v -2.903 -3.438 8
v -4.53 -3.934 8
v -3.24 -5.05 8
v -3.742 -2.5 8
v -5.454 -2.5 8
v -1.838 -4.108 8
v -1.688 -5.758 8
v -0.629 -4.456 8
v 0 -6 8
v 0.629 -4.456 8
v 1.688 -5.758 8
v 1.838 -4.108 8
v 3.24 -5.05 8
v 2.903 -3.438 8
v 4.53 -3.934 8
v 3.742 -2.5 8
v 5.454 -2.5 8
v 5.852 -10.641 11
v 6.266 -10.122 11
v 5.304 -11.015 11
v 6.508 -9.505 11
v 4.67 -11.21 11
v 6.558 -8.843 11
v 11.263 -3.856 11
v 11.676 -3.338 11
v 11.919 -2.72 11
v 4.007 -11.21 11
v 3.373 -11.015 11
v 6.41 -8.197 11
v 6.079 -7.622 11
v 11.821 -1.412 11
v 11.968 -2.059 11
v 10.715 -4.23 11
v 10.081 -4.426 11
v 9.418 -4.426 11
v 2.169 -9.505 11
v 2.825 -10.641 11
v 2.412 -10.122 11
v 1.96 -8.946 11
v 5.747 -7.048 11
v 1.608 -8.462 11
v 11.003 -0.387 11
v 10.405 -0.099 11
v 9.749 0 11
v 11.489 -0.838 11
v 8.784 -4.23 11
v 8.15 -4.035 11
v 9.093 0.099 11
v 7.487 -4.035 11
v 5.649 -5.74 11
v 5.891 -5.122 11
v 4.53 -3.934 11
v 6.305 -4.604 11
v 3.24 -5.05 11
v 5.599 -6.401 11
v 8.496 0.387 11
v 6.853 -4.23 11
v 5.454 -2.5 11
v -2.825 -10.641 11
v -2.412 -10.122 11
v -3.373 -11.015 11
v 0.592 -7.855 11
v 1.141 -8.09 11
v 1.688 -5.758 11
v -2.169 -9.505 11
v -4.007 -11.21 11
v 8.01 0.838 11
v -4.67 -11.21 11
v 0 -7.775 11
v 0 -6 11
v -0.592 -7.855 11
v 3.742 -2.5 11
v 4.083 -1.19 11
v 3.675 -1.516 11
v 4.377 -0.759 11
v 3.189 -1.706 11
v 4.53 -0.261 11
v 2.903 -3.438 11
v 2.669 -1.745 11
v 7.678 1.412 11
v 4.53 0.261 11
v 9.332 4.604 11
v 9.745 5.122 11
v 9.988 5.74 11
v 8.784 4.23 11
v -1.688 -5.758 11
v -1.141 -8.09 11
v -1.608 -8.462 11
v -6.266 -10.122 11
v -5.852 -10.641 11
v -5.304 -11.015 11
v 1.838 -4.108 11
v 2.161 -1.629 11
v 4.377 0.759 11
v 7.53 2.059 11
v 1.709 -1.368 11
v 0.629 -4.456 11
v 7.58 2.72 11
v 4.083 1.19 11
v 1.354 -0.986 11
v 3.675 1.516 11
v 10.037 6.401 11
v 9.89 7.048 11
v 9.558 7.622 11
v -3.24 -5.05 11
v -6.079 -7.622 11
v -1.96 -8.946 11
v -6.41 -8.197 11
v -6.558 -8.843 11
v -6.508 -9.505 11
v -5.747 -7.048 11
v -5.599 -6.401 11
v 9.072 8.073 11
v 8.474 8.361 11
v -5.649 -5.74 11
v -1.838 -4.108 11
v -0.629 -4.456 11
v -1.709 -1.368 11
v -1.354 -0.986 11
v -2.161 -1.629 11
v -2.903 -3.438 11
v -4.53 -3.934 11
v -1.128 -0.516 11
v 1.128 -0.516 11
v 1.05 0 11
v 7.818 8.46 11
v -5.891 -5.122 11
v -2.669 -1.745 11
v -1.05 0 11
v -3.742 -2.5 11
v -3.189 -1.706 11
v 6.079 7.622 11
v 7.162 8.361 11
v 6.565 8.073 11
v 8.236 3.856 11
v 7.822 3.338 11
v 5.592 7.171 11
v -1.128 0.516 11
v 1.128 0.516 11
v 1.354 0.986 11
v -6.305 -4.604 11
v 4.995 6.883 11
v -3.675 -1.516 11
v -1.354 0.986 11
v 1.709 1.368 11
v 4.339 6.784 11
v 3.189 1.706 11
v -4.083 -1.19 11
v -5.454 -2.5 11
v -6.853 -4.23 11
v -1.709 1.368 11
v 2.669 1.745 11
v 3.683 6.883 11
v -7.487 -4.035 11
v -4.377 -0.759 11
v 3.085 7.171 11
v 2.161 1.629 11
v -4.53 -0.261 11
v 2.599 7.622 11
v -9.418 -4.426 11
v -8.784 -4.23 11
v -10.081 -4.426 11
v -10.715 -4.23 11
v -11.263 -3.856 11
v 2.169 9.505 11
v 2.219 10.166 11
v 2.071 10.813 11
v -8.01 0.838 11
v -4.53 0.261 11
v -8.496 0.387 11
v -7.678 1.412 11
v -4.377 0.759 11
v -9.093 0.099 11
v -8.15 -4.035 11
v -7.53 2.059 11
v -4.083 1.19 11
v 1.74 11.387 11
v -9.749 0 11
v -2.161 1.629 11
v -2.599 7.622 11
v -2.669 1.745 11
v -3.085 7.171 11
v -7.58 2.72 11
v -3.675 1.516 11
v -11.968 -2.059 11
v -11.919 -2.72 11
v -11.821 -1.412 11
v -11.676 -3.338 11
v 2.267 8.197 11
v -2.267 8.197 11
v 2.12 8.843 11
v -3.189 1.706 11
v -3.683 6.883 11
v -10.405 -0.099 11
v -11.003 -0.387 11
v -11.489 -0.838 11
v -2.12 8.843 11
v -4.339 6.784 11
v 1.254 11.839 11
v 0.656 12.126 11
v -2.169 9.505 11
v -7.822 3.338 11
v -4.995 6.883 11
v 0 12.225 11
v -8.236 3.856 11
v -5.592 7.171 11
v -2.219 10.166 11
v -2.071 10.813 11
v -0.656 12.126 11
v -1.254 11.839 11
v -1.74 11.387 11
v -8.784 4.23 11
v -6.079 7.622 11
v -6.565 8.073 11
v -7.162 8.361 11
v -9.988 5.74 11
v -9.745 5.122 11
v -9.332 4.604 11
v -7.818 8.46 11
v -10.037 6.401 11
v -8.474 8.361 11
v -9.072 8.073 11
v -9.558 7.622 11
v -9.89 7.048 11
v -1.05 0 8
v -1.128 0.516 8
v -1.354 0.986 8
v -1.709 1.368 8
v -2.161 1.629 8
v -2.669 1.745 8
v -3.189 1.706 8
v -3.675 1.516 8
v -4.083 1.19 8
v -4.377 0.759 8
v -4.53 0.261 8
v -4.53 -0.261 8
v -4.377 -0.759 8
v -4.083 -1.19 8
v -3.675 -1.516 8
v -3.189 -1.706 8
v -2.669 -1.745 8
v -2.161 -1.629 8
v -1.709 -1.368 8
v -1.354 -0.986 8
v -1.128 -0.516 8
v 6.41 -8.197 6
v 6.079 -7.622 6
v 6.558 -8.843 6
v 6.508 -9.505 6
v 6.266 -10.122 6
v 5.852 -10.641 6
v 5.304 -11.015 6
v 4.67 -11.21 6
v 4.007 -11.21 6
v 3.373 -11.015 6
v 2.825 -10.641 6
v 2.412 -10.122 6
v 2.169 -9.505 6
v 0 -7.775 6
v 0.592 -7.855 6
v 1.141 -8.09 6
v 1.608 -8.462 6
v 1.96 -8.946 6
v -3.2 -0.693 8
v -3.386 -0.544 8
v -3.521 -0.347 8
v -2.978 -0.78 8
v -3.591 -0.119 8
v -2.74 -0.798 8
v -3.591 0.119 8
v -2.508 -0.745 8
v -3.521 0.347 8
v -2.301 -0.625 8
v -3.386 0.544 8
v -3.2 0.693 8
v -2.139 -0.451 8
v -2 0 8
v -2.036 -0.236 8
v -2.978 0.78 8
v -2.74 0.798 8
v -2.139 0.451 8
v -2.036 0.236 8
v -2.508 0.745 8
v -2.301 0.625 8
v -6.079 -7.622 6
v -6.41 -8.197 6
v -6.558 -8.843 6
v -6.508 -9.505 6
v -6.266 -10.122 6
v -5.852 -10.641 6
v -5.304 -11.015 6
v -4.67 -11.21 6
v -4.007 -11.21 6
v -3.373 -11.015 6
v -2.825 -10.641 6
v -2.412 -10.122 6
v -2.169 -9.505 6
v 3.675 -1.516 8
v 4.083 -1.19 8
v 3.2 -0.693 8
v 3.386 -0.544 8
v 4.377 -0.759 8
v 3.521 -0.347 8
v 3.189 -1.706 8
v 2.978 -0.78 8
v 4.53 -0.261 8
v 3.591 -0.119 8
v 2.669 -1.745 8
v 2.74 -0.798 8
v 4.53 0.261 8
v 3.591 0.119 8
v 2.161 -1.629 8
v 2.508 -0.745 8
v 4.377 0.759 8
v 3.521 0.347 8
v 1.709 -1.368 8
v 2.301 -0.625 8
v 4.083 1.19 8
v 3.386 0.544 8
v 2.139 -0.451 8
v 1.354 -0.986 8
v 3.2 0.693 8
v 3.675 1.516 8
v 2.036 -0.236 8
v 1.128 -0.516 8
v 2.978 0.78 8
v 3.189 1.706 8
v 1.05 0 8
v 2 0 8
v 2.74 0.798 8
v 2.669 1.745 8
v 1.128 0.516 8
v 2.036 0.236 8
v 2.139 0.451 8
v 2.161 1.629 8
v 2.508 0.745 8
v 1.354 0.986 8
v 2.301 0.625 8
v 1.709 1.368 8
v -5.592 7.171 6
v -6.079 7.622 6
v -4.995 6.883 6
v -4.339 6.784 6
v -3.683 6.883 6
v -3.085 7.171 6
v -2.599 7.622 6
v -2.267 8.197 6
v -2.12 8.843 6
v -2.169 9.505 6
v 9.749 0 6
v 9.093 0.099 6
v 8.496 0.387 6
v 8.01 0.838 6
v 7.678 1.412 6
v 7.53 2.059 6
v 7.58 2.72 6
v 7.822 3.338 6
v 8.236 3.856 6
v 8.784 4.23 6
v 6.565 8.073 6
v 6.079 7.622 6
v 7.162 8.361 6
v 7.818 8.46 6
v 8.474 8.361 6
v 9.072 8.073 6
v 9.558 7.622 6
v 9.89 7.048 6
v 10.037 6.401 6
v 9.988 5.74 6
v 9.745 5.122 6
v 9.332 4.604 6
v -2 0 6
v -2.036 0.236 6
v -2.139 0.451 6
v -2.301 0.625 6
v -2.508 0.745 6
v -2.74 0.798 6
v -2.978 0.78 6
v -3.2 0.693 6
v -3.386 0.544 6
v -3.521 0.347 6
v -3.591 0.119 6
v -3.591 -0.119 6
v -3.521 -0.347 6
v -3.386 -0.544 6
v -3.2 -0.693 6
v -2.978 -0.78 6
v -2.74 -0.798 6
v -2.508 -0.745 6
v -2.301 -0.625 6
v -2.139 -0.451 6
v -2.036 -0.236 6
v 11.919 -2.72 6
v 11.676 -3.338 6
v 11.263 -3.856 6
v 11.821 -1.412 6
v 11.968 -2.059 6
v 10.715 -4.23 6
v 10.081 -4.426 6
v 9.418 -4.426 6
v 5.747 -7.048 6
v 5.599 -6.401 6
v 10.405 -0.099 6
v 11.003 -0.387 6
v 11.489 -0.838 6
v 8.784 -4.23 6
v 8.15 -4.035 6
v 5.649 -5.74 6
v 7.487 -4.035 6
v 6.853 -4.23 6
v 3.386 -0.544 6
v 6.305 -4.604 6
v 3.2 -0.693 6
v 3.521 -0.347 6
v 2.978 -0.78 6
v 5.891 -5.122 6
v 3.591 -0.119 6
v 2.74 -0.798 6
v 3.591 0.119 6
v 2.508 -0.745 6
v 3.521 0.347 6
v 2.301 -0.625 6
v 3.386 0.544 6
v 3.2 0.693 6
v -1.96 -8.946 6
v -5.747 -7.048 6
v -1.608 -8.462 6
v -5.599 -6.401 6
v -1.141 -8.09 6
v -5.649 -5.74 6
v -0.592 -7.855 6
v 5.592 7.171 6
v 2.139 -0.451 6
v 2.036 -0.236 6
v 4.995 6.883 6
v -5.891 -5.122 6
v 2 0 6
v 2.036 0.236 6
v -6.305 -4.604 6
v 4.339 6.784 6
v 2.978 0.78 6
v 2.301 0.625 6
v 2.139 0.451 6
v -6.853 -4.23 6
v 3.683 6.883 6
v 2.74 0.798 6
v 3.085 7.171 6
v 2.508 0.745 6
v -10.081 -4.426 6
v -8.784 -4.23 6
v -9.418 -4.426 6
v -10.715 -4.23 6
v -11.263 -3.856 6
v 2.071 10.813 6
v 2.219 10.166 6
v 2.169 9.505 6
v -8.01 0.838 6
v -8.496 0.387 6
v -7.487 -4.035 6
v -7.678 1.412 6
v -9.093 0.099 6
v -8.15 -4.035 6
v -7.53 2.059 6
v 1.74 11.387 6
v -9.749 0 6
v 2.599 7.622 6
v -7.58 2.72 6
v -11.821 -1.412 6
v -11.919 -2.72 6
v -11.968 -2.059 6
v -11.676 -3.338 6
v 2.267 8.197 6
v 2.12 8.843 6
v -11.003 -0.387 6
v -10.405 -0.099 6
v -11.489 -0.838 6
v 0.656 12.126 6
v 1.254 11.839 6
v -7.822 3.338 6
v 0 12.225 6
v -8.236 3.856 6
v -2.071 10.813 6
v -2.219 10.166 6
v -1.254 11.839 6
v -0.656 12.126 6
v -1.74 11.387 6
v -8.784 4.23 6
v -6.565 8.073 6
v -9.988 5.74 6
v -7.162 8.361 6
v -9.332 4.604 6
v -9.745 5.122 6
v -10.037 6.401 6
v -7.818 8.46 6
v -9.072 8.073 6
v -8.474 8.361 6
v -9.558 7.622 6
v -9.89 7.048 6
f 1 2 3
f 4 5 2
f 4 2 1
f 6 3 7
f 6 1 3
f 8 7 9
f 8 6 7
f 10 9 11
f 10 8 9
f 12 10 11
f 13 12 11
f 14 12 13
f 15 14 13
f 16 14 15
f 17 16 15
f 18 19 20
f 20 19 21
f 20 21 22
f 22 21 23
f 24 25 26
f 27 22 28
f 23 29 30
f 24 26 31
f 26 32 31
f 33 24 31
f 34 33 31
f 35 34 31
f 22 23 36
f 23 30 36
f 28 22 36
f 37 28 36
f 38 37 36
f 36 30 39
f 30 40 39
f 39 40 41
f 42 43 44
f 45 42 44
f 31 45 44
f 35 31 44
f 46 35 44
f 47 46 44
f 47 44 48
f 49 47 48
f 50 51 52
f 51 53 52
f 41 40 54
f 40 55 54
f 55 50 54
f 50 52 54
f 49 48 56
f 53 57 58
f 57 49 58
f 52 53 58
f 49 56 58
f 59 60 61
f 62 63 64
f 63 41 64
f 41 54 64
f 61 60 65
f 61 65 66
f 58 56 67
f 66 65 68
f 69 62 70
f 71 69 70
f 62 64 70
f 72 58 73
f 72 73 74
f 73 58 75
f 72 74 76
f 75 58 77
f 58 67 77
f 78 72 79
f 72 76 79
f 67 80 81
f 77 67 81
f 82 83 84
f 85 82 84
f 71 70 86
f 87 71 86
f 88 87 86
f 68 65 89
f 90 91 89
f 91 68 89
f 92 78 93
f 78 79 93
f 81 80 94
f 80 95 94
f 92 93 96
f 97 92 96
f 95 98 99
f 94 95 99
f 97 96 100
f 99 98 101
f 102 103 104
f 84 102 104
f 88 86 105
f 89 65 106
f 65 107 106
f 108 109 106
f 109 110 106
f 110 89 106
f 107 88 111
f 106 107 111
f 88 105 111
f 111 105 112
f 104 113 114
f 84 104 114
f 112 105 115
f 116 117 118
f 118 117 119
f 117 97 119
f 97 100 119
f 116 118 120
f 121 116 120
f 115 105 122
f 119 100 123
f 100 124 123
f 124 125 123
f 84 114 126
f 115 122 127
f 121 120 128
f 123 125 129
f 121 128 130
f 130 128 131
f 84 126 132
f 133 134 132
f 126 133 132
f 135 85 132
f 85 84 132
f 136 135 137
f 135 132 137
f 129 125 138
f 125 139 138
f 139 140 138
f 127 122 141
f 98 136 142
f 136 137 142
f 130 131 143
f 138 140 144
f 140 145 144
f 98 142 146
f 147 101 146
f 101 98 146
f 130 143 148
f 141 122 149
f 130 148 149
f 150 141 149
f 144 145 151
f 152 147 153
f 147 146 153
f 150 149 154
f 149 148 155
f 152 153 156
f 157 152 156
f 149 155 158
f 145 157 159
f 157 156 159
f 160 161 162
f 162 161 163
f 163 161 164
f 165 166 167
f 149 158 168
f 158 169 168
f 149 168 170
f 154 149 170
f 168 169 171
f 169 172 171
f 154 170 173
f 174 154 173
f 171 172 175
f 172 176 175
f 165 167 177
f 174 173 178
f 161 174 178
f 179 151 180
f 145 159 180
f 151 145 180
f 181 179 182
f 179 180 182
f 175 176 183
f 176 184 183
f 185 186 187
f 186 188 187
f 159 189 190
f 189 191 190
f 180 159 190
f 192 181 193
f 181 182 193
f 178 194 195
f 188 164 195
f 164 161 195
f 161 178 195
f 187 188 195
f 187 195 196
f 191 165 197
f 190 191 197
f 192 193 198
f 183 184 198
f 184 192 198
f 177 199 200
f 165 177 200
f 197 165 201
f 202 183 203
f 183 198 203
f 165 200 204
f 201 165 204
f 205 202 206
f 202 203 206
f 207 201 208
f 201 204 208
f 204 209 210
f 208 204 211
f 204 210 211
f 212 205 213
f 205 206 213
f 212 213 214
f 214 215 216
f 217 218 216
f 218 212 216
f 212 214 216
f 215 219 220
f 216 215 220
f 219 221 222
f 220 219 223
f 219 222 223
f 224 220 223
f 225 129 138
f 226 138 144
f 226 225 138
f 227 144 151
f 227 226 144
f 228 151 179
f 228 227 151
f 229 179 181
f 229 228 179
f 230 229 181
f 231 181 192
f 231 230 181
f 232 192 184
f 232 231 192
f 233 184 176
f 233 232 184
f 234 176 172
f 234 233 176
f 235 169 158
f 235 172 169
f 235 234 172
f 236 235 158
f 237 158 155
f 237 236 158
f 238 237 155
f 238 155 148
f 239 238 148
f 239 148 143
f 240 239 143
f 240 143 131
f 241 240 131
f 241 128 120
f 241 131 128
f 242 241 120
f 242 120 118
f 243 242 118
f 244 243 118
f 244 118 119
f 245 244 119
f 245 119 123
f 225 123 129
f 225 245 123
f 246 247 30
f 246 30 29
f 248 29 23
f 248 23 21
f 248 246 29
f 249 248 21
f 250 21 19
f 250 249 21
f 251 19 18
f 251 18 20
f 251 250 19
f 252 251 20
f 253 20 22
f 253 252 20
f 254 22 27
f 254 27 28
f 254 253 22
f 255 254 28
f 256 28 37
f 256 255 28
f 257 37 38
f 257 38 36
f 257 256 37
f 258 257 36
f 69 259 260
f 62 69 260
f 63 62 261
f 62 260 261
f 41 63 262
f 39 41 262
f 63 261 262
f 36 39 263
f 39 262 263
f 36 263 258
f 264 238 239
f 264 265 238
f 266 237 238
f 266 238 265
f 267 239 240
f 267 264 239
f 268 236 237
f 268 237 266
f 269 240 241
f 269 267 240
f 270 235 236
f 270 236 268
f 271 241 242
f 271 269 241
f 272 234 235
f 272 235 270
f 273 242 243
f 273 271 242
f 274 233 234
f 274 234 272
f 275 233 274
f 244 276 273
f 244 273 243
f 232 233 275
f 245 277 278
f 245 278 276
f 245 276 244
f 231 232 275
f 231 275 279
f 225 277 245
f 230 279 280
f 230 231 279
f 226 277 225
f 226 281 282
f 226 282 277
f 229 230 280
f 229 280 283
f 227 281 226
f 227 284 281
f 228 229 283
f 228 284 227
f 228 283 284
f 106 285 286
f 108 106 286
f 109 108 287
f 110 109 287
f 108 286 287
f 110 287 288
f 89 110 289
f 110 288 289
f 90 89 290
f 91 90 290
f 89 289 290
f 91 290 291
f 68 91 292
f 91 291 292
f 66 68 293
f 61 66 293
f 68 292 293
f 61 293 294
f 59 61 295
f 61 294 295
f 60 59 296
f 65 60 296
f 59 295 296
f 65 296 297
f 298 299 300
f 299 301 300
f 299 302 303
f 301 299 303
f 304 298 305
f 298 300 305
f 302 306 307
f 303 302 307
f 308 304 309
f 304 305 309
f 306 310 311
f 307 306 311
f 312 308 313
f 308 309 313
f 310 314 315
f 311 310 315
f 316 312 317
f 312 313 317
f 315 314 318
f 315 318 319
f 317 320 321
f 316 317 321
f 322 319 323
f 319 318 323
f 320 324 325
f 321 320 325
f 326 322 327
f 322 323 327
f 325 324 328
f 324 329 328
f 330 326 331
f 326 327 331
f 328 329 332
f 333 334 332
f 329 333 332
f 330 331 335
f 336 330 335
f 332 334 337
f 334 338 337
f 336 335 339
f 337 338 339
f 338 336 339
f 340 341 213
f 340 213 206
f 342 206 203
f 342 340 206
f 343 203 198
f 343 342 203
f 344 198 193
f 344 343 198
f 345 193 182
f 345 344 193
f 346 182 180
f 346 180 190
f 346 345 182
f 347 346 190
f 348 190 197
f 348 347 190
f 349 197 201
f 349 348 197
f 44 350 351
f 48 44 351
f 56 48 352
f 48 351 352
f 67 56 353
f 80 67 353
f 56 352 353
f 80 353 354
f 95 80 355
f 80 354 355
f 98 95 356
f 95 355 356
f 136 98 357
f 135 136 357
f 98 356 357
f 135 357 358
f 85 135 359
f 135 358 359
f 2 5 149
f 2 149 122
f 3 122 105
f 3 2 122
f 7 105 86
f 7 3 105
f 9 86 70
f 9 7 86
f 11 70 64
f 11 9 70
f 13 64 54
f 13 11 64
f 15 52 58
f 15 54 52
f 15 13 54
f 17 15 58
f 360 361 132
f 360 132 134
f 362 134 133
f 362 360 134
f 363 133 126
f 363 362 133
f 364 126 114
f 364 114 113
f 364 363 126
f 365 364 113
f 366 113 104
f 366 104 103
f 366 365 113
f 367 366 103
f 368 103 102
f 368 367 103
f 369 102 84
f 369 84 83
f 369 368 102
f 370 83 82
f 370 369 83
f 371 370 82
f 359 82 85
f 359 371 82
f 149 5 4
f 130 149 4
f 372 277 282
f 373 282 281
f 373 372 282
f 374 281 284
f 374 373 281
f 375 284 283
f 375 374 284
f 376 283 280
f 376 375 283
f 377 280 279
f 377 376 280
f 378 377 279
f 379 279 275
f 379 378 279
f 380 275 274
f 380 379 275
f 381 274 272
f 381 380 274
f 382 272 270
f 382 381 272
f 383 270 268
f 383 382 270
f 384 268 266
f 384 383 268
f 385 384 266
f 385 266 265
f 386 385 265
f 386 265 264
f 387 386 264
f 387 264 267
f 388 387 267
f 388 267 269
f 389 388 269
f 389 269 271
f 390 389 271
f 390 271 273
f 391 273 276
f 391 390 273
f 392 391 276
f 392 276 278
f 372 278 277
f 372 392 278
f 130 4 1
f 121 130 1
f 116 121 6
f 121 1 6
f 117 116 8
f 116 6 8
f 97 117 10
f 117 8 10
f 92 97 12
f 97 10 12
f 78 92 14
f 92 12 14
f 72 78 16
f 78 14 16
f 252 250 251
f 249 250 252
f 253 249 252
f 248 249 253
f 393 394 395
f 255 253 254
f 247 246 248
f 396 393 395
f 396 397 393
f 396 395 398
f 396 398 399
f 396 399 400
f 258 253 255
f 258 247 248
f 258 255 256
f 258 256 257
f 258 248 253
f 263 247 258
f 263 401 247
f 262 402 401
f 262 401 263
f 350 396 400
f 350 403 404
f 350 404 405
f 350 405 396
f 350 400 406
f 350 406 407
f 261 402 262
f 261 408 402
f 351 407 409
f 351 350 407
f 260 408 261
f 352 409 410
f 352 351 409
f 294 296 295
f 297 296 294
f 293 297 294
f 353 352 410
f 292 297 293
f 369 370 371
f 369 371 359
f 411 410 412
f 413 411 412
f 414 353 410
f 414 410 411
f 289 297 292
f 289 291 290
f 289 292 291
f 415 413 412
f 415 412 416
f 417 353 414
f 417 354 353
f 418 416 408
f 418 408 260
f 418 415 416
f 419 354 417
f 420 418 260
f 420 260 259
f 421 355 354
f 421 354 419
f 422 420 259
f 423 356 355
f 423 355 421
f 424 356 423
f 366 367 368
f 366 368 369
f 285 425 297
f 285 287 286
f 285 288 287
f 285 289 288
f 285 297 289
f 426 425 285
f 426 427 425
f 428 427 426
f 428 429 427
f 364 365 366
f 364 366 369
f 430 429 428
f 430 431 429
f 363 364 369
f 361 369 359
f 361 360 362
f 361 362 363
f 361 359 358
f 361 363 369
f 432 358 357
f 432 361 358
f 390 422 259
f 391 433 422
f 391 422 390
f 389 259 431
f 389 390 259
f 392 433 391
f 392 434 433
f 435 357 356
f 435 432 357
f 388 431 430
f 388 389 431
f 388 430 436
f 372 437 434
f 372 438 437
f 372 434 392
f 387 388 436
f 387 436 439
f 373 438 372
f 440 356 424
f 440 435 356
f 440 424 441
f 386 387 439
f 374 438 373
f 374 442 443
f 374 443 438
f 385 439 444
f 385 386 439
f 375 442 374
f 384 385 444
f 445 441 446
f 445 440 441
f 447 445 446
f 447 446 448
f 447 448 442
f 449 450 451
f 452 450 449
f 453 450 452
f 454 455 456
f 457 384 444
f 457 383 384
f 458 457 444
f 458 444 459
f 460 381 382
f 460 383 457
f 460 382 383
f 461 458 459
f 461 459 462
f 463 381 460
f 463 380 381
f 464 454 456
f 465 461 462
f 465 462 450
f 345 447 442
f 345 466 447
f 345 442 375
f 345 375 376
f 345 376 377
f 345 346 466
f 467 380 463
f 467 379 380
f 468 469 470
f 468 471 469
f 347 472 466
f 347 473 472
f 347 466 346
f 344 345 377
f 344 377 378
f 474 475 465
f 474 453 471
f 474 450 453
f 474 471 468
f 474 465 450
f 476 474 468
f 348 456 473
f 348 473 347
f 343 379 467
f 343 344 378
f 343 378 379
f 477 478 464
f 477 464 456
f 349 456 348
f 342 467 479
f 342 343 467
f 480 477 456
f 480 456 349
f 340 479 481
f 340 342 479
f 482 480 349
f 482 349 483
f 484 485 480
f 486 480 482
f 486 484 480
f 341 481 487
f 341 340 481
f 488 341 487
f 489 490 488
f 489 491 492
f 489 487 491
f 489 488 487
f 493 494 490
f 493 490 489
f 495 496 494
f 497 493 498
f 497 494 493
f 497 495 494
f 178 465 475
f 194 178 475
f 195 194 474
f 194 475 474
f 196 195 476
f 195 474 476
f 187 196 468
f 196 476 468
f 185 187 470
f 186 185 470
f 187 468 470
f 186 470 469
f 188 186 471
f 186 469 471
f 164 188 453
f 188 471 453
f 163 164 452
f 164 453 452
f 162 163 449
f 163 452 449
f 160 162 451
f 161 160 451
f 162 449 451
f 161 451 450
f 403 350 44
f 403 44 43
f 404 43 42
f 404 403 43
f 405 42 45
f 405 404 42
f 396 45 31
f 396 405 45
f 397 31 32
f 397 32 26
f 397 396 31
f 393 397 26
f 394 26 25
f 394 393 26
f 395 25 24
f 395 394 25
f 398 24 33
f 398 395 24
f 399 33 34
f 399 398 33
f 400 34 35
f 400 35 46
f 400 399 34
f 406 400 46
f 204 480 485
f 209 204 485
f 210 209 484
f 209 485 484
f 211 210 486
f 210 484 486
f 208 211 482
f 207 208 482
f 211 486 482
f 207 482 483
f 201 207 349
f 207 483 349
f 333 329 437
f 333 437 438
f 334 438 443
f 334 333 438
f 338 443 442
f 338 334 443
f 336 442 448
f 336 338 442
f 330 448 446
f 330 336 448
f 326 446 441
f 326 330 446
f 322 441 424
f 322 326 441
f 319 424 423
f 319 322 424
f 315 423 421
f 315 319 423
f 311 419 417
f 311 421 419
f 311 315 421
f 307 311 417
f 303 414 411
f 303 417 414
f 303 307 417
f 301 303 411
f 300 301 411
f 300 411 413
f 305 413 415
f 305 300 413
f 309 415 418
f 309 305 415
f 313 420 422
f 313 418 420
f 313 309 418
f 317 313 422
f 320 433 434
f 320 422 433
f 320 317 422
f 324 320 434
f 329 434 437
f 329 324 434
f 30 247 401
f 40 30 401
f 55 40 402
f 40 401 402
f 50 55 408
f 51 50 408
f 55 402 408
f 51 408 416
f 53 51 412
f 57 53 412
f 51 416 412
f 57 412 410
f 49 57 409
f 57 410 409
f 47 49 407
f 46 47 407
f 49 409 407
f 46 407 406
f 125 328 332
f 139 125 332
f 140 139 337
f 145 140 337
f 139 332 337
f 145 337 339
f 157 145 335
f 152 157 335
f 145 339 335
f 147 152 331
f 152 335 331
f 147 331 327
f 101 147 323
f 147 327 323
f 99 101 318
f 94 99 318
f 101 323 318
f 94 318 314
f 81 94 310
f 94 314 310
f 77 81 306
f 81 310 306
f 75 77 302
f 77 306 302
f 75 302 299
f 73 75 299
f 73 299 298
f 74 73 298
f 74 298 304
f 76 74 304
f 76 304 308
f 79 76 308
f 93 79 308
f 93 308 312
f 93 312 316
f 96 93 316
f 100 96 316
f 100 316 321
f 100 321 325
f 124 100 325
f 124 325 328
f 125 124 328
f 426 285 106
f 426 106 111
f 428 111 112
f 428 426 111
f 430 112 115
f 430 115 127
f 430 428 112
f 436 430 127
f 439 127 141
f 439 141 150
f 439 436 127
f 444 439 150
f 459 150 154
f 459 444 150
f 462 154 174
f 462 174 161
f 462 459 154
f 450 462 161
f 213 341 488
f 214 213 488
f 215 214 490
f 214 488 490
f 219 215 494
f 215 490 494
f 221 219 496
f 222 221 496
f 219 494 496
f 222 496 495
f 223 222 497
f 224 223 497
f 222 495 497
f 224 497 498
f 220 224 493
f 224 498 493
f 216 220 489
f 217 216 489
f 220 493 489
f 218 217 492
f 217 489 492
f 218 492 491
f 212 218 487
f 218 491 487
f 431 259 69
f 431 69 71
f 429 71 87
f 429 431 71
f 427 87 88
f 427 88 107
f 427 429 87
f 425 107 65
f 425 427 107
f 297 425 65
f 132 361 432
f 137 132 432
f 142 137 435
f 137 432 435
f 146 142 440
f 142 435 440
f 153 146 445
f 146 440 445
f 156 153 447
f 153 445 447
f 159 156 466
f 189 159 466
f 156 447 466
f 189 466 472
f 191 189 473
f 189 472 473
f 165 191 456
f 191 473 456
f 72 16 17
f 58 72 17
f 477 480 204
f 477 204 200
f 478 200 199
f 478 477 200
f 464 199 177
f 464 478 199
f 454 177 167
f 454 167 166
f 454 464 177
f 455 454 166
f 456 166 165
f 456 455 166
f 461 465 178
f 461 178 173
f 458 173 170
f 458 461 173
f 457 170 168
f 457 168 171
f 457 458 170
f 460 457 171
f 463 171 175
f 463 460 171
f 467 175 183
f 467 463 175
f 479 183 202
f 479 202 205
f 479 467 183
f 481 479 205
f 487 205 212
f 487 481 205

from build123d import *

# Parameters (mm, degrees)
PAD004_DEPTH         = 5
SKETCH012_R          = 0.8
POCKET006_DEPTH      = 67.792744
POCKET006_DEPTH_BACK = 72.792744
SKETCH013_R          = 1.75
POCKET007_DEPTH      = 70.792744
POCKET009_DEPTH      = 5


with BuildPart() as part:
    # Sketch011 (on DatumPlane) → Pad004 (new body)
    with BuildSketch(Plane.XY.offset(6)):
        with BuildLine():
            ThreePointArc((0, 12.225209), (-1.739739, 11.387395), (-2.169419, 9.504844))
            ThreePointArc((-6.078576, 7.622293), (-3.373355, 7.004844), (-2.169419, 9.504844))
            ThreePointArc((-6.078576, 7.622293), (-9.558054, 7.622293), (-8.783797, 4.230054))
            ThreePointArc((-9.749279, 0), (-7.57986, 1.730054), (-8.783797, 4.230054))
            ThreePointArc((-9.749279, 0), (-11.918698, -2.720365), (-8.783797, -4.230054))
            ThreePointArc((-6.078576, -7.622293), (-6.078576, -4.847503), (-8.783797, -4.230054))
            ThreePointArc((-6.078576, -7.622293), (-5.30432, -11.014533), (-2.169419, -9.504844))
            ThreePointArc((0, -7.774791), (-1.387395, -8.260261), (-2.169419, -9.504844))
            Line((0, 12.225209), (0, -7.774791))
        make_face()
    pad004 = extrude(amount=PAD004_DEPTH)

    # Mirrored003: Pad004 across Sketch011 V_Axis
    add(pad004.mirror(Plane(origin=(0, 0, 6), x_dir=(0, 0, 1), z_dir=(1, 0, 0))))

    # Sketch012 (on DatumPlane) → Pocket006 (cut, two sides)
    with BuildSketch(Plane.XY.offset(6)) as pocket006_sk:
        with Locations((-2.8, 0)):
            Circle(SKETCH012_R)
    pocket006 = extrude(amount=-POCKET006_DEPTH, mode=Mode.SUBTRACT) + extrude(pocket006_sk.sketch, amount=POCKET006_DEPTH_BACK, mode=Mode.SUBTRACT)

    # Sketch013 (on DatumPlane) → Pocket007 (cut, through all)
    with BuildSketch(Plane.XY.offset(8)):
        with Locations((-2.8, 0)):
            Circle(SKETCH013_R)
    pocket007 = extrude(amount=POCKET007_DEPTH, mode=Mode.SUBTRACT)

    # Mirrored004: Pocket006, Pocket007 across Sketch012 V_Axis
    add(pocket006.mirror(Plane(origin=(0, 0, 6), x_dir=(0, 0, 1), z_dir=(1, 0, 0))), mode=Mode.SUBTRACT)
    add(pocket007.mirror(Plane(origin=(0, 0, 6), x_dir=(0, 0, 1), z_dir=(1, 0, 0))), mode=Mode.SUBTRACT)

    # Sketch014 (on DatumPlane) → Pocket009 (cut)
    with BuildSketch(Plane.XY.offset(8)):
        with BuildLine():
            ThreePointArc((-5.454356, -2.5), (0, -6), (5.454356, -2.5))
            Line((3.741657, -2.5), (5.454356, -2.5))
            ThreePointArc((-3.741657, -2.5), (0, -4.5), (3.741657, -2.5))
            Line((-5.454356, -2.5), (-3.741657, -2.5))
        make_face()
    extrude(amount=POCKET009_DEPTH, mode=Mode.SUBTRACT)


solid = part.part
